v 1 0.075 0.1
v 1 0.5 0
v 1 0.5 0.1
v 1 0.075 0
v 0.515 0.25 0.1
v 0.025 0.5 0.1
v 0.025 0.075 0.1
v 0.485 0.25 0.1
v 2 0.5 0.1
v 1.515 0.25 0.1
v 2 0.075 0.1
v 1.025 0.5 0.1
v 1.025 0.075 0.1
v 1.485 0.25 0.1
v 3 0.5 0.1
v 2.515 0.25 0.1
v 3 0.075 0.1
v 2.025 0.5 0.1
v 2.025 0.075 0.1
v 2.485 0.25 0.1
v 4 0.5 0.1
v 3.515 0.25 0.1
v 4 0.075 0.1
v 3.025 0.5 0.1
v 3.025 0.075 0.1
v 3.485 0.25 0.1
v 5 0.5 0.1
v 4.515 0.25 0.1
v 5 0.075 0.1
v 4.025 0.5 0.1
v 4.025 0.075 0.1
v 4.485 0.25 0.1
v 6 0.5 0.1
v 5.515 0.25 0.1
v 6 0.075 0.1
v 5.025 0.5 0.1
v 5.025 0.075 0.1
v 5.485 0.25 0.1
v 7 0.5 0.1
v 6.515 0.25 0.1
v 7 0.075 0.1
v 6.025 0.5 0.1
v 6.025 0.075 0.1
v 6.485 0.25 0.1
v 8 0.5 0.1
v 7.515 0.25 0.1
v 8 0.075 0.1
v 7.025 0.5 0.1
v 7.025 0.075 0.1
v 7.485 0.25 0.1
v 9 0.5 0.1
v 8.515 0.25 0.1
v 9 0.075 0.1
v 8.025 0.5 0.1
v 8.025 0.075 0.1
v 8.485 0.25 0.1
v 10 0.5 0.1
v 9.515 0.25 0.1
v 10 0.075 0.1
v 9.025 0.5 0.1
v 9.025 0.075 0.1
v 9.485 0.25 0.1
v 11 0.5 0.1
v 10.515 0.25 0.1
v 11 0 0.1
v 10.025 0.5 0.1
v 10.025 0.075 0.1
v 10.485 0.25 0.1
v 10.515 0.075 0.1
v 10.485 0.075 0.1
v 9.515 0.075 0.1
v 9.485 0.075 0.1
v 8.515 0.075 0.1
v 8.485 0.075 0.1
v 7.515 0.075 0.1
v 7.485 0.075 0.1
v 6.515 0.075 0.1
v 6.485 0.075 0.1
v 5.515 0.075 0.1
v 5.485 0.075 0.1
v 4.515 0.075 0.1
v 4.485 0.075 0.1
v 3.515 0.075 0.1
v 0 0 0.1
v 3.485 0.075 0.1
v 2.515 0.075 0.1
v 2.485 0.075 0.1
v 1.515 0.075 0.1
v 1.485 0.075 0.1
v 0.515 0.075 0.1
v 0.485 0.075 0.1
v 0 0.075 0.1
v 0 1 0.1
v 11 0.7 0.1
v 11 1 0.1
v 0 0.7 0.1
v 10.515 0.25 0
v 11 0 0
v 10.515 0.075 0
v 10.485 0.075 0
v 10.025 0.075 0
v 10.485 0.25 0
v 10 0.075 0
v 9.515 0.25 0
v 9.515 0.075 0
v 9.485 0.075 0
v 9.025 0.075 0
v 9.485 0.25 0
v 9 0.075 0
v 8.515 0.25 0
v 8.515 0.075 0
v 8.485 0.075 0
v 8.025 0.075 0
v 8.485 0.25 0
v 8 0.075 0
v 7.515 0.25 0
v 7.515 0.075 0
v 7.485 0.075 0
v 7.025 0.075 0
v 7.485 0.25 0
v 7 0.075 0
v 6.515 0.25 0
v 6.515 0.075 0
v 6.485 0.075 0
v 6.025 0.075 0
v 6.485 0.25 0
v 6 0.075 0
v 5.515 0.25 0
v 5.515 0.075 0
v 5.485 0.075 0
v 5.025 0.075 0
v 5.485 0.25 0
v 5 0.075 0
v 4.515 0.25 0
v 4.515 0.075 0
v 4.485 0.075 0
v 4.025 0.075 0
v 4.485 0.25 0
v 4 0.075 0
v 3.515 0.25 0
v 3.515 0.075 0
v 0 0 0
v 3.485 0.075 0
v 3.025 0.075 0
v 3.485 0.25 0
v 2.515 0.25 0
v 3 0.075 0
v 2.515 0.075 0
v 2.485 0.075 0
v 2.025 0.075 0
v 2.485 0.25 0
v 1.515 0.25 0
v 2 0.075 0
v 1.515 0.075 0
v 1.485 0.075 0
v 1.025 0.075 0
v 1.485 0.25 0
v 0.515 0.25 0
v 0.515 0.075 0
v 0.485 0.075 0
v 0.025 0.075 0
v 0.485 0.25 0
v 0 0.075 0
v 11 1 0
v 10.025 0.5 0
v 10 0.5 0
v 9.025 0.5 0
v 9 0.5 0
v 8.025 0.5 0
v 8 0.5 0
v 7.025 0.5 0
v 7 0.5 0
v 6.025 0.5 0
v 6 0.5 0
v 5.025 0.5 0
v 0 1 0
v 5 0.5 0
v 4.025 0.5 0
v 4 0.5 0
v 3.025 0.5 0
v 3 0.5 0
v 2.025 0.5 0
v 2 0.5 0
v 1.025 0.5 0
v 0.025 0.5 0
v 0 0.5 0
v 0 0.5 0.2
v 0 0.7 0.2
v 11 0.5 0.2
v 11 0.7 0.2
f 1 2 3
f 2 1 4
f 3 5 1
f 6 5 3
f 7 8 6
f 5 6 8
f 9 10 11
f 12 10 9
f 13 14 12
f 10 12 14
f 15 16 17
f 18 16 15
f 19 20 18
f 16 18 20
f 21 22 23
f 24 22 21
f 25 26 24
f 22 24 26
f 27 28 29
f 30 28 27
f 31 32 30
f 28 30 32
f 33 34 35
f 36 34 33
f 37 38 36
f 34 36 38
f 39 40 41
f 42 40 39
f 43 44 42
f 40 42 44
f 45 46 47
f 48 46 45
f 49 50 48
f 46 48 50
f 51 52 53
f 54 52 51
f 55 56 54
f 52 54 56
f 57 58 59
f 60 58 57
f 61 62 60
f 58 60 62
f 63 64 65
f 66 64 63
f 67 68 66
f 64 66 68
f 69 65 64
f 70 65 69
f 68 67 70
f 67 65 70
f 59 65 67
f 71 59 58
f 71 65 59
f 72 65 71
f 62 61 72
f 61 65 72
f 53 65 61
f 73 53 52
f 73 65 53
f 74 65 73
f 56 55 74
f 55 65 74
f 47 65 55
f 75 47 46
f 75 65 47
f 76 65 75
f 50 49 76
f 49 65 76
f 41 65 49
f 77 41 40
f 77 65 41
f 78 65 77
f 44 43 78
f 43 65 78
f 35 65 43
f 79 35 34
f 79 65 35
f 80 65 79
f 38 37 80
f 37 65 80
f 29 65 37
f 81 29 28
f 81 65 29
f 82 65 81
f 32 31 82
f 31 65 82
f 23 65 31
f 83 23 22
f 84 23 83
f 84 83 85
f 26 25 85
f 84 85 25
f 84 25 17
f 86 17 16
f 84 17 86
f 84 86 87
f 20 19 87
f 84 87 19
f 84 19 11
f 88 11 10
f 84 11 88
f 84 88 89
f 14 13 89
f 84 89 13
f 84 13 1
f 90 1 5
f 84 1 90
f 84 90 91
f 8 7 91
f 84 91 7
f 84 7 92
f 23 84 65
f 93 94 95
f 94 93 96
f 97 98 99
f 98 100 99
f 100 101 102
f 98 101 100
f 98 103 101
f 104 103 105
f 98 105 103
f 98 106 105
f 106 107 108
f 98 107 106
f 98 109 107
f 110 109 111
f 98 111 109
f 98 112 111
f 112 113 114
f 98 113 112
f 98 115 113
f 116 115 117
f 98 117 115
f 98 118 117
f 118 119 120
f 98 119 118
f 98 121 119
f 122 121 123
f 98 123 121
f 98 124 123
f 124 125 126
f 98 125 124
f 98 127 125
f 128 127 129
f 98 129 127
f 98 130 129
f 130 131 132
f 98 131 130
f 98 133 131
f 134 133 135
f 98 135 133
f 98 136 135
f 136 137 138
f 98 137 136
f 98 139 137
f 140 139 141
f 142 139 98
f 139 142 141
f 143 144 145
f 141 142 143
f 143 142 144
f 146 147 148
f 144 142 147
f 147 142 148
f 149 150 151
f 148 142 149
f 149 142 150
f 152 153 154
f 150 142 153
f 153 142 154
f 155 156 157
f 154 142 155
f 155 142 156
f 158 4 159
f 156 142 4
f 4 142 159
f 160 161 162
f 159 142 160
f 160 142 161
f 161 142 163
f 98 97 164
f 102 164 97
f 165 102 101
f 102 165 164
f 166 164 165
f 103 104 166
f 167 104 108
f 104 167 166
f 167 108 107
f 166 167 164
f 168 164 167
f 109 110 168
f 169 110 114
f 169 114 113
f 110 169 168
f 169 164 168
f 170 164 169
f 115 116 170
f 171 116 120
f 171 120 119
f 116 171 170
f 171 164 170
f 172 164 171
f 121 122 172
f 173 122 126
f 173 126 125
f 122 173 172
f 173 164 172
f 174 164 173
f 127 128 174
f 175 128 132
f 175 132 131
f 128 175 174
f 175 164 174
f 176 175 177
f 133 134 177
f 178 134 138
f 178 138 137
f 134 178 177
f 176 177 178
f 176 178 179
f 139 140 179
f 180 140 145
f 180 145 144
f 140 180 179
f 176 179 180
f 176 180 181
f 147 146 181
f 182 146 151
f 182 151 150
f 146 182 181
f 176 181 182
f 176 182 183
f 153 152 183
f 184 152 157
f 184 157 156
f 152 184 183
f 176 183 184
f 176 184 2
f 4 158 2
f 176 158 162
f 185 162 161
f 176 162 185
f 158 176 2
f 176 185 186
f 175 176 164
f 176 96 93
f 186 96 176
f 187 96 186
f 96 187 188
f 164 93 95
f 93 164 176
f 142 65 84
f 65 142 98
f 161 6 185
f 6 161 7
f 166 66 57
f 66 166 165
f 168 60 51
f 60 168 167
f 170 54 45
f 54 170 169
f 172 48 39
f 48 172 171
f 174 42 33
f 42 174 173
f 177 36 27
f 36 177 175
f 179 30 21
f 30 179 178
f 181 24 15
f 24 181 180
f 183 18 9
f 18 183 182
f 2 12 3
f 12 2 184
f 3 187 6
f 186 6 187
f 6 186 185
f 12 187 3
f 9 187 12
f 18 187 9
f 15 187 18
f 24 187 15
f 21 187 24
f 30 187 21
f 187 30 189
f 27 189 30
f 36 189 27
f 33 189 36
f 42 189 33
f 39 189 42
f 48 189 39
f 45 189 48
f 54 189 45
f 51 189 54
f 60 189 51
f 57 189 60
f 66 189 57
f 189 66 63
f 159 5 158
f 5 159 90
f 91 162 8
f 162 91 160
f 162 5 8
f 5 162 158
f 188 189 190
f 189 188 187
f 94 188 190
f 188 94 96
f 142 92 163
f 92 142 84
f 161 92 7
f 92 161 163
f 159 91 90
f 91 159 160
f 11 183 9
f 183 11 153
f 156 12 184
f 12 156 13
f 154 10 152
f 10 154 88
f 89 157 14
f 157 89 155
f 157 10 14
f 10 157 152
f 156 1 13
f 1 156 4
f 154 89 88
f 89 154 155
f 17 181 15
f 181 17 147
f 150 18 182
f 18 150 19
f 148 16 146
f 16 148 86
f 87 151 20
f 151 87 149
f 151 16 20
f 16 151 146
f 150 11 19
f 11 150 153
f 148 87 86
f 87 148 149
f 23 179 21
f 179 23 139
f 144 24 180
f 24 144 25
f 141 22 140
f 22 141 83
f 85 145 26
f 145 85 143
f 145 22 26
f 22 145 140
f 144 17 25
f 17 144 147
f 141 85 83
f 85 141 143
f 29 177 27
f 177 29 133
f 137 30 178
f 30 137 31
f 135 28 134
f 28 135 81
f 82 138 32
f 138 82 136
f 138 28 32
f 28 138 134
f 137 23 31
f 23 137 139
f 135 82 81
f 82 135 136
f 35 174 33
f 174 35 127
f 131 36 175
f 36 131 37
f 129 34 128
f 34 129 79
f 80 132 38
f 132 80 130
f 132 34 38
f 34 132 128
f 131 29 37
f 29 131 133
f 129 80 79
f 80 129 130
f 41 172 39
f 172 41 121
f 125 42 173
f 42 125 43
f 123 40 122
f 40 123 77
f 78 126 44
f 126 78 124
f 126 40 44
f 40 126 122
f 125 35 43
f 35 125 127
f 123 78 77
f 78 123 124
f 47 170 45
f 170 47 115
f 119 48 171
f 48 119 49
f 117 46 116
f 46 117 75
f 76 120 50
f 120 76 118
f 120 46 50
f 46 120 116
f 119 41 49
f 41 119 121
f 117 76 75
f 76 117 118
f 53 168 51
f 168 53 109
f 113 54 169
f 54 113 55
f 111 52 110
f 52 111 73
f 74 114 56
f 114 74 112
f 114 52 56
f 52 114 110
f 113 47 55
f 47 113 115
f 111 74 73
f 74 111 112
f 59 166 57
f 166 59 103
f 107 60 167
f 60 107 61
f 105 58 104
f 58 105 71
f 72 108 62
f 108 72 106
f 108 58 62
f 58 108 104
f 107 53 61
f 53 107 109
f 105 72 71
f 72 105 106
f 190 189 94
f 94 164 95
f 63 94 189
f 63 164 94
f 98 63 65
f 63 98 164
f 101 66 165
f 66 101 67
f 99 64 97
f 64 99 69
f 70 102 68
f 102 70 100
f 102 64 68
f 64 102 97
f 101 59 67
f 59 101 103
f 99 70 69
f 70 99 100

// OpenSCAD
//righello da 10 cm
l=10;
for(i = [0:l])
{
    union()
    {
    difference()
    {
    difference()
    {
        translate([i,0,0]) cube([1, 1, 0.1]);
        translate([i, 0, 0]) cube([0.05, 1, 2], center=true);
    }
    translate([i+0.5, 0, 0]) cube([0.03, 0.5, 2], center=true);
    }
    translate([i, 0.5,0])cube([1,0.2,0.2]);
    translate([i, 0,0])cube([1,0.075,0.1]);
    }
}
